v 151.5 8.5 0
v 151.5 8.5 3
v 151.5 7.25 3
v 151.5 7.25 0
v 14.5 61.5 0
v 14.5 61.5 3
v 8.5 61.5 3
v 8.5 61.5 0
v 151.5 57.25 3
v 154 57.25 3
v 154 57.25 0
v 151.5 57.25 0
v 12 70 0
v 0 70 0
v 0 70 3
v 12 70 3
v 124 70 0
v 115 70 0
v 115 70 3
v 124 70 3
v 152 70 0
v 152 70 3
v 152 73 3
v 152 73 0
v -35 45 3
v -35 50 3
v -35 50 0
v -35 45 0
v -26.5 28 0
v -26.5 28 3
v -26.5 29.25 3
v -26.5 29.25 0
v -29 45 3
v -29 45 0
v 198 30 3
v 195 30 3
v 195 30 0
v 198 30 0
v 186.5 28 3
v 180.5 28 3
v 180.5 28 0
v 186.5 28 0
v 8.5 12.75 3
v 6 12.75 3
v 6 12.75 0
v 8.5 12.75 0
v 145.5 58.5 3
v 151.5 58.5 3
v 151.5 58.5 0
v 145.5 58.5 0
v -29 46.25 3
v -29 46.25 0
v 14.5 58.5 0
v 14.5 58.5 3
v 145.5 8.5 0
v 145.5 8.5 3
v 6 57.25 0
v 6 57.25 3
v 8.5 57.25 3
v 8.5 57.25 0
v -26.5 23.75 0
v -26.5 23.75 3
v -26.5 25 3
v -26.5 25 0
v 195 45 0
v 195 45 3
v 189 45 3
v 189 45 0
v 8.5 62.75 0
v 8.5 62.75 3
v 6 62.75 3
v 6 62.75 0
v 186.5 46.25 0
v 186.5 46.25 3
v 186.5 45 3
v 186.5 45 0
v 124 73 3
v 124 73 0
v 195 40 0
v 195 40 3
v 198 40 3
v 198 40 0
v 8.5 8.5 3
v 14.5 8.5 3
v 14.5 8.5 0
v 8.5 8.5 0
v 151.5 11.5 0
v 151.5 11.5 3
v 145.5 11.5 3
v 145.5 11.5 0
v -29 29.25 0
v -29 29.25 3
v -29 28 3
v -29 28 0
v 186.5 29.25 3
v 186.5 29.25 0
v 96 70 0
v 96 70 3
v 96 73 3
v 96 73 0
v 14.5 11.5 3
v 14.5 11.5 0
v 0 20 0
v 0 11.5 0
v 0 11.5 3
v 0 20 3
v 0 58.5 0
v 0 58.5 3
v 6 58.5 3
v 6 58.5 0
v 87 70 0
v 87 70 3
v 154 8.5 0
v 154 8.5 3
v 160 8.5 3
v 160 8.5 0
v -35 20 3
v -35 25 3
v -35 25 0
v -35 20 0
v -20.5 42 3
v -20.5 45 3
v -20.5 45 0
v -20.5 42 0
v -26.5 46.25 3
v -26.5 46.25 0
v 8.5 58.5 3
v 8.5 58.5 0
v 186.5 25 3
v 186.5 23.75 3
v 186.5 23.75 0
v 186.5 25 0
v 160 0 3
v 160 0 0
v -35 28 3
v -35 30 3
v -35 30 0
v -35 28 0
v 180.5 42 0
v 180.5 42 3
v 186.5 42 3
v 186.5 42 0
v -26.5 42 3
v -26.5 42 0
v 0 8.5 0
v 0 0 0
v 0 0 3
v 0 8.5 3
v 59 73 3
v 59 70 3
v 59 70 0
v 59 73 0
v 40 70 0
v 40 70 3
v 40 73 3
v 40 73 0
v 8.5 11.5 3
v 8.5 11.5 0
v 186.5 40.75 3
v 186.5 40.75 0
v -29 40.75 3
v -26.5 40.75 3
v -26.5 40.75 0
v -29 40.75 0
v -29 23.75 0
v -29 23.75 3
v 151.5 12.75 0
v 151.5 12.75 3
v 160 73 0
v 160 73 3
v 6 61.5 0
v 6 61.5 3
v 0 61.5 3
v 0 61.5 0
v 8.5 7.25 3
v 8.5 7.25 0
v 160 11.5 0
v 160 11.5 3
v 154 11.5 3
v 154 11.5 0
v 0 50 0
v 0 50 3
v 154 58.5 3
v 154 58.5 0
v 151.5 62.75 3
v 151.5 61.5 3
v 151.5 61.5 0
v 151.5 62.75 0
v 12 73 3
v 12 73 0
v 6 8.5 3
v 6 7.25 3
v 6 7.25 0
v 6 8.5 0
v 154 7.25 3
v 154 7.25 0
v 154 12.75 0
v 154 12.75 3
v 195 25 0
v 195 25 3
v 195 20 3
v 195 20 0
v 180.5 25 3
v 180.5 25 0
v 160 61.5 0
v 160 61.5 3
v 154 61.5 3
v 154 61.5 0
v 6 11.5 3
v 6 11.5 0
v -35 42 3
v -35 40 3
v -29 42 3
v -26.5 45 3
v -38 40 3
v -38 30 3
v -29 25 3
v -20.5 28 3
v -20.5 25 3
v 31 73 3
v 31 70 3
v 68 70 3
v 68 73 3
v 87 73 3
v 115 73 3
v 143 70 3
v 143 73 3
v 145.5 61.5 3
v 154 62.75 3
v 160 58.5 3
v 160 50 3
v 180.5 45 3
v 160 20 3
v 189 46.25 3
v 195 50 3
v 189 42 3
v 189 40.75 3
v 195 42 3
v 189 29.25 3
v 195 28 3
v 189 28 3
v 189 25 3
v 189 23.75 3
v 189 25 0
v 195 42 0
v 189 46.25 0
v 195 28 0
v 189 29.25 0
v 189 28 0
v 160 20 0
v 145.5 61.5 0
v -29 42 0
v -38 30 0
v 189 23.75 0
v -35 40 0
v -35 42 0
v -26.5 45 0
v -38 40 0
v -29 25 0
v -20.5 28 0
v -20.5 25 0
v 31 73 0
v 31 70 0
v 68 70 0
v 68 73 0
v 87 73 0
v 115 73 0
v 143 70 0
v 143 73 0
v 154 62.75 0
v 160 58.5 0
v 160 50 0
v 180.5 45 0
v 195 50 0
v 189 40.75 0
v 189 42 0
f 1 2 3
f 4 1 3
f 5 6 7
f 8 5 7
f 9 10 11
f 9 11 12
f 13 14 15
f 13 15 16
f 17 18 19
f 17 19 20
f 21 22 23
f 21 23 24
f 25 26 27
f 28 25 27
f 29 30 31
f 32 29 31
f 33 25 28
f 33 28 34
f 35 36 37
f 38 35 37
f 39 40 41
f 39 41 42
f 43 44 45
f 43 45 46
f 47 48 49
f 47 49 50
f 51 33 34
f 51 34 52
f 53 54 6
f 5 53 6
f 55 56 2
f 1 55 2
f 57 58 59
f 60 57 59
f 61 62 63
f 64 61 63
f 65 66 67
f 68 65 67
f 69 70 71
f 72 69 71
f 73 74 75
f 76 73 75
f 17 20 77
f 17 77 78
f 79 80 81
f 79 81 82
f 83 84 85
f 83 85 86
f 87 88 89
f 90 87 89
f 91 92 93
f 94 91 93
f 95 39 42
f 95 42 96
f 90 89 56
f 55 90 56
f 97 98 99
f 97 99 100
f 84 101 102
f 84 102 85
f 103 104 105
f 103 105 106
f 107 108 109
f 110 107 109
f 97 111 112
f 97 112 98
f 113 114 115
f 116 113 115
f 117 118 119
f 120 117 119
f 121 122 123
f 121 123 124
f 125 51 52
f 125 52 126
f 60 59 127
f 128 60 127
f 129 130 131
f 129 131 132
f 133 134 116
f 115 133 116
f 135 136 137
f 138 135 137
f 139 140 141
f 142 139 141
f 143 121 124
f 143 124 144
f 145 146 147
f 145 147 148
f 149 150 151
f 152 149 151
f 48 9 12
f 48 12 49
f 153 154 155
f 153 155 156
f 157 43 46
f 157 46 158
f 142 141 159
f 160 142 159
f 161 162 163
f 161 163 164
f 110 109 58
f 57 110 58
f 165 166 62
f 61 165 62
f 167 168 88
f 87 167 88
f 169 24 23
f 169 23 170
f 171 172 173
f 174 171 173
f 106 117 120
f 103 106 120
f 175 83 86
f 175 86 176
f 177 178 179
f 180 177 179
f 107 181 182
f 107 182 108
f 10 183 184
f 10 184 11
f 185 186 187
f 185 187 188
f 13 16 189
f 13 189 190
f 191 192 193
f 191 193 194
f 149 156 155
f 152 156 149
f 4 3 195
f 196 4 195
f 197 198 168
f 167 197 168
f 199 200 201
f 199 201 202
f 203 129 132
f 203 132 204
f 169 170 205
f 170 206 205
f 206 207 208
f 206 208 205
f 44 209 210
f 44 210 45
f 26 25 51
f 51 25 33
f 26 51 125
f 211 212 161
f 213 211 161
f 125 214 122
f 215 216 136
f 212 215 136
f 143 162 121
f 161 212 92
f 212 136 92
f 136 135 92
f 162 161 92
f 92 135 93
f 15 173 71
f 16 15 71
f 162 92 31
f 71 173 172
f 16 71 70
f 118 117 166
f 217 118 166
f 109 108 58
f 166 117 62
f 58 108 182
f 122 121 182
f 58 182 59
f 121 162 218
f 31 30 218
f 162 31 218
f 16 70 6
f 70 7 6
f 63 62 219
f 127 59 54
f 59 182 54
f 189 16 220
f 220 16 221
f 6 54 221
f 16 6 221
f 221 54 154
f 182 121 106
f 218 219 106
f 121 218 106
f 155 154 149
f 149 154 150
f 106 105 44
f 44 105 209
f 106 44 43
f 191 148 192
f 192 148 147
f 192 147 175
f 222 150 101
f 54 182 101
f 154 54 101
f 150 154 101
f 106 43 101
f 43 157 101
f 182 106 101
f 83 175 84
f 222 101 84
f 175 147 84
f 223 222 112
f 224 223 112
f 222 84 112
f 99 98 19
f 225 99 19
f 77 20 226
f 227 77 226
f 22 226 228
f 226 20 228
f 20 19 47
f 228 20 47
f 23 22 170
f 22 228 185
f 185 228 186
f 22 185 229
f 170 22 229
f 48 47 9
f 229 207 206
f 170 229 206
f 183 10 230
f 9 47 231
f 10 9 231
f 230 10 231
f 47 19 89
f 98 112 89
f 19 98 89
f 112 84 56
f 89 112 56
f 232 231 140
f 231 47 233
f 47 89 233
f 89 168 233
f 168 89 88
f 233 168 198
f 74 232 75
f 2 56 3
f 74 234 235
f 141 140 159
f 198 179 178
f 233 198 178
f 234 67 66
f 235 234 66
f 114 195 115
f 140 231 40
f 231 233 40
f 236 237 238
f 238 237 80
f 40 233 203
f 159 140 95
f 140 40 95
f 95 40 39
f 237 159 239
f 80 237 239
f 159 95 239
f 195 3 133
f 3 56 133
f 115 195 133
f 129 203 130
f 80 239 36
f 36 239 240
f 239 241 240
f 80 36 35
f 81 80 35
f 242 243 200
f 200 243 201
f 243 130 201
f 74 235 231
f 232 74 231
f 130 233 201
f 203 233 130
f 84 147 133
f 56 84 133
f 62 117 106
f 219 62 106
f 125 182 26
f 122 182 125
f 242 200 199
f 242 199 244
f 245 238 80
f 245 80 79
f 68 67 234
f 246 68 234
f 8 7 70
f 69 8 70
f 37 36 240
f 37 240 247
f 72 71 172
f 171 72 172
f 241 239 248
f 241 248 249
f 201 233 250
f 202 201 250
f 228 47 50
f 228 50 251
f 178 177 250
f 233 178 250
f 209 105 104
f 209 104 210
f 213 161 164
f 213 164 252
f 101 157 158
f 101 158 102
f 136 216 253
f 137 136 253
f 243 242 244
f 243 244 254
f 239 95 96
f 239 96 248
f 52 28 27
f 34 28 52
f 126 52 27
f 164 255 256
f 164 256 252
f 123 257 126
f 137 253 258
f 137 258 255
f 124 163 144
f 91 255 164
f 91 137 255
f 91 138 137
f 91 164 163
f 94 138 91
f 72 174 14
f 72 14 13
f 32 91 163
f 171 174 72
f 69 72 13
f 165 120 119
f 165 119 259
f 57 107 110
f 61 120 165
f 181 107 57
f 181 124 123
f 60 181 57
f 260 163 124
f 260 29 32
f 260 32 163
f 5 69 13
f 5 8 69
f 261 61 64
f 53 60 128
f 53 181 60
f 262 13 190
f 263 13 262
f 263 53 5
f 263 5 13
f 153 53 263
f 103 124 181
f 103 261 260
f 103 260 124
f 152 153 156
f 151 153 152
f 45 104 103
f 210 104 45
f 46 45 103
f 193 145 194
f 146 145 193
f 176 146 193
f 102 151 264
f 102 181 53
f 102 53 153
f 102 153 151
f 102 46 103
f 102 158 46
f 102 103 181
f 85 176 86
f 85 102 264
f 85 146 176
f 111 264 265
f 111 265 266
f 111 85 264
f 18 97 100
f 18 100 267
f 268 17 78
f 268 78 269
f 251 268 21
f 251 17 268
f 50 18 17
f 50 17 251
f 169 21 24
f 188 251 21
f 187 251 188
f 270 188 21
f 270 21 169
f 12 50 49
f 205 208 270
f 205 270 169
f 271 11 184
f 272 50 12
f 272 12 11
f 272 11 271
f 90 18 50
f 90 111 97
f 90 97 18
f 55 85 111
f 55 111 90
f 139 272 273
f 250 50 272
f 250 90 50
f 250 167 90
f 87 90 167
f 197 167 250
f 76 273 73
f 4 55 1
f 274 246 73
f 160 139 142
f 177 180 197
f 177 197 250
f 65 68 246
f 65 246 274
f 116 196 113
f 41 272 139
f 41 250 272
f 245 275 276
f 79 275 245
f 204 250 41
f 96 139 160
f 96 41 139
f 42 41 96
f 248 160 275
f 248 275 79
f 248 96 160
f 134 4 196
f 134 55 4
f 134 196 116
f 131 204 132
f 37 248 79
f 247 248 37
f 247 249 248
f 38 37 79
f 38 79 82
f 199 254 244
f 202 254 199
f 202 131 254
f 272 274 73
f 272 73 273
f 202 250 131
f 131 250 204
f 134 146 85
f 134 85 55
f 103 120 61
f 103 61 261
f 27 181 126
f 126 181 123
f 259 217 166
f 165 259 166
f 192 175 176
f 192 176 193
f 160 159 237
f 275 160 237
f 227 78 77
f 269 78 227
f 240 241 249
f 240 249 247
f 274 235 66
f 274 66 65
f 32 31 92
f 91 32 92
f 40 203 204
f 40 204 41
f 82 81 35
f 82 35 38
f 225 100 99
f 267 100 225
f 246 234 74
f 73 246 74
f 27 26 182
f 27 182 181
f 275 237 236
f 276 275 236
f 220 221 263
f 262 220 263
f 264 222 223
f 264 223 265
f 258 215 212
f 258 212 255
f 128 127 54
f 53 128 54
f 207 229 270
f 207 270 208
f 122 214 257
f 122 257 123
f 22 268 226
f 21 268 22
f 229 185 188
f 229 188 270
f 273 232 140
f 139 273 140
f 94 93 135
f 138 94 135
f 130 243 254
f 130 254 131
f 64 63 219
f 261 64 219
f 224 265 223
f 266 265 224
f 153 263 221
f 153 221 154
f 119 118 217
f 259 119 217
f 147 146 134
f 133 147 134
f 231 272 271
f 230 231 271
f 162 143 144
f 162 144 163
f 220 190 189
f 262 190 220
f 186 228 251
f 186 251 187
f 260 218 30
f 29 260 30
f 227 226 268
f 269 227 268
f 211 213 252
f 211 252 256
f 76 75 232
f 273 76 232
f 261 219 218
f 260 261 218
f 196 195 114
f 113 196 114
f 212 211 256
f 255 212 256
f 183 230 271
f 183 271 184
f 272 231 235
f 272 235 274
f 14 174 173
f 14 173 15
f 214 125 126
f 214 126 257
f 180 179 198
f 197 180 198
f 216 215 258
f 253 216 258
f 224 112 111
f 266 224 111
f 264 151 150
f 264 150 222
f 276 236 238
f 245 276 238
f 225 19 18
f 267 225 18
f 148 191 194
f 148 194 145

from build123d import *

# Parameters (mm, degrees)
SKETCH_1_W             = 160
SKETCH_1_H             = 70
EXTRUDE_1_DEPTH        = 3
EXTRUDE_2_DEPTH        = 35
EXTRUDE_2_DEPTH_BACK   = 195
SKETCH_2_W             = 3
SKETCH_2_H             = 30
EXTRUDE_3_DEPTH        = 3
EXTRUDE_3_DEPTH_BACK   = 233
SKETCH_3_W             = 3
SKETCH_3_H             = 10
CUT_EXTRUDE_1_DEPTH    = 3
CUT_EXTRUDE_2_DEPTH    = 3
SKETCH_6_W             = 8
SKETCH_6_H             = 3
EXTRUDE_4_DEPTH        = 3
SKETCH_7_W             = 19
SKETCH_7_H             = 3
EXTRUDE_5_DEPTH        = 3
PATTERN_LINEAR_1_COUNT = 5
PATTERN_LINEAR_1_PITCH = 28


with BuildPart() as part:
    # Эскиз1 → Бобышка-Вытянуть1 (new body)
    with BuildSketch(Plane.XY):
        with Locations((80, 35)):
            Rectangle(SKETCH_1_W, SKETCH_1_H)
    extrude(amount=EXTRUDE_1_DEPTH)

    # Эскиз2 → Бобышка-Вытянуть2 (add, two sides: drawn at the far end of the back side and taken through both)
    with BuildSketch(Plane(origin=(160, 0, 0), x_dir=(0, 0, -1), z_dir=(1, 0, 0)).offset(-EXTRUDE_2_DEPTH_BACK)):
        with Locations((-1.5, 35)):
            Rectangle(SKETCH_2_W, SKETCH_2_H)
    extrude(amount=EXTRUDE_2_DEPTH + EXTRUDE_2_DEPTH_BACK)

    # Эскиз3 → Бобышка-Вытянуть3 (add, two sides: drawn at the far end of the back side and taken through both)
    with BuildSketch(Plane(origin=(195, 0, 0), x_dir=(0, 0, -1), z_dir=(1, 0, 0)).offset(-EXTRUDE_3_DEPTH_BACK)):
        with Locations((-1.5, 35)):
            Rectangle(SKETCH_3_W, SKETCH_3_H)
    extrude(amount=EXTRUDE_3_DEPTH + EXTRUDE_3_DEPTH_BACK)

    # Эскиз4 → Вырез-Вытянуть1 (cut)
    with BuildSketch(Plane.XY.offset(3)):
        Polygon((160, 58.5), (154, 58.5), (154, 57.25), (151.5, 57.25), (151.5, 58.5), (145.5, 58.5), (145.5, 61.5), (151.5, 61.5), (151.5, 62.75), (154, 62.75), (154, 61.5), (160, 61.5), align=None)
        Polygon((160, 8.5), (160, 11.5), (154, 11.5), (154, 12.75), (151.5, 12.75), (151.5, 11.5), (145.5, 11.5), (145.5, 8.5), (151.5, 8.5), (151.5, 7.25), (154, 7.25), (154, 8.5), align=None)
        Polygon((0, 11.5), (6, 11.5), (6, 12.75), (8.5, 12.75), (8.5, 11.5), (14.5, 11.5), (14.5, 8.5), (8.5, 8.5), (8.5, 7.25), (6, 7.25), (6, 8.5), (0, 8.5), align=None)
        Polygon((0, 61.5), (0, 58.5), (6, 58.5), (6, 57.25), (8.5, 57.25), (8.5, 58.5), (14.5, 58.5), (14.5, 61.5), (8.5, 61.5), (8.5, 62.75), (6, 62.75), (6, 61.5), align=None)
    extrude(amount=-CUT_EXTRUDE_1_DEPTH, mode=Mode.SUBTRACT)

    # Эскиз5 → Вырез-Вытянуть2 (cut)
    with BuildSketch(Plane.XY.offset(3)):
        Polygon((195, 45), (189, 45), (189, 46.25), (186.5, 46.25), (186.5, 45), (180.5, 45), (180.5, 42), (186.5, 42), (186.5, 40.75), (189, 40.75), (189, 42), (195, 42), align=None)
        Polygon((195, 28), (195, 25), (189, 25), (189, 23.75), (186.5, 23.75), (186.5, 25), (180.5, 25), (180.5, 28), (186.5, 28), (186.5, 29.25), (189, 29.25), (189, 28), align=None)
        Polygon((-35, 25), (-29, 25), (-29, 23.75), (-26.5, 23.75), (-26.5, 25), (-20.5, 25), (-20.5, 28), (-26.5, 28), (-26.5, 29.25), (-29, 29.25), (-29, 28), (-35, 28), align=None)
        Polygon((-35, 42), (-35, 45), (-29, 45), (-29, 46.25), (-26.5, 46.25), (-26.5, 45), (-20.5, 45), (-20.5, 42), (-26.5, 42), (-26.5, 40.75), (-29, 40.75), (-29, 42), align=None)
    extrude(amount=-CUT_EXTRUDE_2_DEPTH, mode=Mode.SUBTRACT)

    # Эскиз6 → Бобышка-Вытянуть4 (add)
    with BuildSketch(Plane(origin=(0, 70, 0), x_dir=(1, 0, 0), z_dir=(0, 1, 0))):
        with Locations((156, -1.5)):
            Rectangle(SKETCH_6_W, SKETCH_6_H)
    extrude(amount=EXTRUDE_4_DEPTH)

    # Эскиз7 → Бобышка-Вытянуть5 (add)
    with BuildSketch(Plane(origin=(0, 70, 0), x_dir=(1, 0, 0), z_dir=(0, 1, 0))):
        with Locations((133.5, -1.5)):
            Rectangle(SKETCH_7_W, SKETCH_7_H)
    extrude_5 = extrude(amount=EXTRUDE_5_DEPTH)

    # Линейный массив1: Бобышка-Вытянуть5 ×5
    with Locations(*[(-i * PATTERN_LINEAR_1_PITCH, 0, 0) for i in range(1, PATTERN_LINEAR_1_COUNT)]):
        add(extrude_5)


solid = part.part
